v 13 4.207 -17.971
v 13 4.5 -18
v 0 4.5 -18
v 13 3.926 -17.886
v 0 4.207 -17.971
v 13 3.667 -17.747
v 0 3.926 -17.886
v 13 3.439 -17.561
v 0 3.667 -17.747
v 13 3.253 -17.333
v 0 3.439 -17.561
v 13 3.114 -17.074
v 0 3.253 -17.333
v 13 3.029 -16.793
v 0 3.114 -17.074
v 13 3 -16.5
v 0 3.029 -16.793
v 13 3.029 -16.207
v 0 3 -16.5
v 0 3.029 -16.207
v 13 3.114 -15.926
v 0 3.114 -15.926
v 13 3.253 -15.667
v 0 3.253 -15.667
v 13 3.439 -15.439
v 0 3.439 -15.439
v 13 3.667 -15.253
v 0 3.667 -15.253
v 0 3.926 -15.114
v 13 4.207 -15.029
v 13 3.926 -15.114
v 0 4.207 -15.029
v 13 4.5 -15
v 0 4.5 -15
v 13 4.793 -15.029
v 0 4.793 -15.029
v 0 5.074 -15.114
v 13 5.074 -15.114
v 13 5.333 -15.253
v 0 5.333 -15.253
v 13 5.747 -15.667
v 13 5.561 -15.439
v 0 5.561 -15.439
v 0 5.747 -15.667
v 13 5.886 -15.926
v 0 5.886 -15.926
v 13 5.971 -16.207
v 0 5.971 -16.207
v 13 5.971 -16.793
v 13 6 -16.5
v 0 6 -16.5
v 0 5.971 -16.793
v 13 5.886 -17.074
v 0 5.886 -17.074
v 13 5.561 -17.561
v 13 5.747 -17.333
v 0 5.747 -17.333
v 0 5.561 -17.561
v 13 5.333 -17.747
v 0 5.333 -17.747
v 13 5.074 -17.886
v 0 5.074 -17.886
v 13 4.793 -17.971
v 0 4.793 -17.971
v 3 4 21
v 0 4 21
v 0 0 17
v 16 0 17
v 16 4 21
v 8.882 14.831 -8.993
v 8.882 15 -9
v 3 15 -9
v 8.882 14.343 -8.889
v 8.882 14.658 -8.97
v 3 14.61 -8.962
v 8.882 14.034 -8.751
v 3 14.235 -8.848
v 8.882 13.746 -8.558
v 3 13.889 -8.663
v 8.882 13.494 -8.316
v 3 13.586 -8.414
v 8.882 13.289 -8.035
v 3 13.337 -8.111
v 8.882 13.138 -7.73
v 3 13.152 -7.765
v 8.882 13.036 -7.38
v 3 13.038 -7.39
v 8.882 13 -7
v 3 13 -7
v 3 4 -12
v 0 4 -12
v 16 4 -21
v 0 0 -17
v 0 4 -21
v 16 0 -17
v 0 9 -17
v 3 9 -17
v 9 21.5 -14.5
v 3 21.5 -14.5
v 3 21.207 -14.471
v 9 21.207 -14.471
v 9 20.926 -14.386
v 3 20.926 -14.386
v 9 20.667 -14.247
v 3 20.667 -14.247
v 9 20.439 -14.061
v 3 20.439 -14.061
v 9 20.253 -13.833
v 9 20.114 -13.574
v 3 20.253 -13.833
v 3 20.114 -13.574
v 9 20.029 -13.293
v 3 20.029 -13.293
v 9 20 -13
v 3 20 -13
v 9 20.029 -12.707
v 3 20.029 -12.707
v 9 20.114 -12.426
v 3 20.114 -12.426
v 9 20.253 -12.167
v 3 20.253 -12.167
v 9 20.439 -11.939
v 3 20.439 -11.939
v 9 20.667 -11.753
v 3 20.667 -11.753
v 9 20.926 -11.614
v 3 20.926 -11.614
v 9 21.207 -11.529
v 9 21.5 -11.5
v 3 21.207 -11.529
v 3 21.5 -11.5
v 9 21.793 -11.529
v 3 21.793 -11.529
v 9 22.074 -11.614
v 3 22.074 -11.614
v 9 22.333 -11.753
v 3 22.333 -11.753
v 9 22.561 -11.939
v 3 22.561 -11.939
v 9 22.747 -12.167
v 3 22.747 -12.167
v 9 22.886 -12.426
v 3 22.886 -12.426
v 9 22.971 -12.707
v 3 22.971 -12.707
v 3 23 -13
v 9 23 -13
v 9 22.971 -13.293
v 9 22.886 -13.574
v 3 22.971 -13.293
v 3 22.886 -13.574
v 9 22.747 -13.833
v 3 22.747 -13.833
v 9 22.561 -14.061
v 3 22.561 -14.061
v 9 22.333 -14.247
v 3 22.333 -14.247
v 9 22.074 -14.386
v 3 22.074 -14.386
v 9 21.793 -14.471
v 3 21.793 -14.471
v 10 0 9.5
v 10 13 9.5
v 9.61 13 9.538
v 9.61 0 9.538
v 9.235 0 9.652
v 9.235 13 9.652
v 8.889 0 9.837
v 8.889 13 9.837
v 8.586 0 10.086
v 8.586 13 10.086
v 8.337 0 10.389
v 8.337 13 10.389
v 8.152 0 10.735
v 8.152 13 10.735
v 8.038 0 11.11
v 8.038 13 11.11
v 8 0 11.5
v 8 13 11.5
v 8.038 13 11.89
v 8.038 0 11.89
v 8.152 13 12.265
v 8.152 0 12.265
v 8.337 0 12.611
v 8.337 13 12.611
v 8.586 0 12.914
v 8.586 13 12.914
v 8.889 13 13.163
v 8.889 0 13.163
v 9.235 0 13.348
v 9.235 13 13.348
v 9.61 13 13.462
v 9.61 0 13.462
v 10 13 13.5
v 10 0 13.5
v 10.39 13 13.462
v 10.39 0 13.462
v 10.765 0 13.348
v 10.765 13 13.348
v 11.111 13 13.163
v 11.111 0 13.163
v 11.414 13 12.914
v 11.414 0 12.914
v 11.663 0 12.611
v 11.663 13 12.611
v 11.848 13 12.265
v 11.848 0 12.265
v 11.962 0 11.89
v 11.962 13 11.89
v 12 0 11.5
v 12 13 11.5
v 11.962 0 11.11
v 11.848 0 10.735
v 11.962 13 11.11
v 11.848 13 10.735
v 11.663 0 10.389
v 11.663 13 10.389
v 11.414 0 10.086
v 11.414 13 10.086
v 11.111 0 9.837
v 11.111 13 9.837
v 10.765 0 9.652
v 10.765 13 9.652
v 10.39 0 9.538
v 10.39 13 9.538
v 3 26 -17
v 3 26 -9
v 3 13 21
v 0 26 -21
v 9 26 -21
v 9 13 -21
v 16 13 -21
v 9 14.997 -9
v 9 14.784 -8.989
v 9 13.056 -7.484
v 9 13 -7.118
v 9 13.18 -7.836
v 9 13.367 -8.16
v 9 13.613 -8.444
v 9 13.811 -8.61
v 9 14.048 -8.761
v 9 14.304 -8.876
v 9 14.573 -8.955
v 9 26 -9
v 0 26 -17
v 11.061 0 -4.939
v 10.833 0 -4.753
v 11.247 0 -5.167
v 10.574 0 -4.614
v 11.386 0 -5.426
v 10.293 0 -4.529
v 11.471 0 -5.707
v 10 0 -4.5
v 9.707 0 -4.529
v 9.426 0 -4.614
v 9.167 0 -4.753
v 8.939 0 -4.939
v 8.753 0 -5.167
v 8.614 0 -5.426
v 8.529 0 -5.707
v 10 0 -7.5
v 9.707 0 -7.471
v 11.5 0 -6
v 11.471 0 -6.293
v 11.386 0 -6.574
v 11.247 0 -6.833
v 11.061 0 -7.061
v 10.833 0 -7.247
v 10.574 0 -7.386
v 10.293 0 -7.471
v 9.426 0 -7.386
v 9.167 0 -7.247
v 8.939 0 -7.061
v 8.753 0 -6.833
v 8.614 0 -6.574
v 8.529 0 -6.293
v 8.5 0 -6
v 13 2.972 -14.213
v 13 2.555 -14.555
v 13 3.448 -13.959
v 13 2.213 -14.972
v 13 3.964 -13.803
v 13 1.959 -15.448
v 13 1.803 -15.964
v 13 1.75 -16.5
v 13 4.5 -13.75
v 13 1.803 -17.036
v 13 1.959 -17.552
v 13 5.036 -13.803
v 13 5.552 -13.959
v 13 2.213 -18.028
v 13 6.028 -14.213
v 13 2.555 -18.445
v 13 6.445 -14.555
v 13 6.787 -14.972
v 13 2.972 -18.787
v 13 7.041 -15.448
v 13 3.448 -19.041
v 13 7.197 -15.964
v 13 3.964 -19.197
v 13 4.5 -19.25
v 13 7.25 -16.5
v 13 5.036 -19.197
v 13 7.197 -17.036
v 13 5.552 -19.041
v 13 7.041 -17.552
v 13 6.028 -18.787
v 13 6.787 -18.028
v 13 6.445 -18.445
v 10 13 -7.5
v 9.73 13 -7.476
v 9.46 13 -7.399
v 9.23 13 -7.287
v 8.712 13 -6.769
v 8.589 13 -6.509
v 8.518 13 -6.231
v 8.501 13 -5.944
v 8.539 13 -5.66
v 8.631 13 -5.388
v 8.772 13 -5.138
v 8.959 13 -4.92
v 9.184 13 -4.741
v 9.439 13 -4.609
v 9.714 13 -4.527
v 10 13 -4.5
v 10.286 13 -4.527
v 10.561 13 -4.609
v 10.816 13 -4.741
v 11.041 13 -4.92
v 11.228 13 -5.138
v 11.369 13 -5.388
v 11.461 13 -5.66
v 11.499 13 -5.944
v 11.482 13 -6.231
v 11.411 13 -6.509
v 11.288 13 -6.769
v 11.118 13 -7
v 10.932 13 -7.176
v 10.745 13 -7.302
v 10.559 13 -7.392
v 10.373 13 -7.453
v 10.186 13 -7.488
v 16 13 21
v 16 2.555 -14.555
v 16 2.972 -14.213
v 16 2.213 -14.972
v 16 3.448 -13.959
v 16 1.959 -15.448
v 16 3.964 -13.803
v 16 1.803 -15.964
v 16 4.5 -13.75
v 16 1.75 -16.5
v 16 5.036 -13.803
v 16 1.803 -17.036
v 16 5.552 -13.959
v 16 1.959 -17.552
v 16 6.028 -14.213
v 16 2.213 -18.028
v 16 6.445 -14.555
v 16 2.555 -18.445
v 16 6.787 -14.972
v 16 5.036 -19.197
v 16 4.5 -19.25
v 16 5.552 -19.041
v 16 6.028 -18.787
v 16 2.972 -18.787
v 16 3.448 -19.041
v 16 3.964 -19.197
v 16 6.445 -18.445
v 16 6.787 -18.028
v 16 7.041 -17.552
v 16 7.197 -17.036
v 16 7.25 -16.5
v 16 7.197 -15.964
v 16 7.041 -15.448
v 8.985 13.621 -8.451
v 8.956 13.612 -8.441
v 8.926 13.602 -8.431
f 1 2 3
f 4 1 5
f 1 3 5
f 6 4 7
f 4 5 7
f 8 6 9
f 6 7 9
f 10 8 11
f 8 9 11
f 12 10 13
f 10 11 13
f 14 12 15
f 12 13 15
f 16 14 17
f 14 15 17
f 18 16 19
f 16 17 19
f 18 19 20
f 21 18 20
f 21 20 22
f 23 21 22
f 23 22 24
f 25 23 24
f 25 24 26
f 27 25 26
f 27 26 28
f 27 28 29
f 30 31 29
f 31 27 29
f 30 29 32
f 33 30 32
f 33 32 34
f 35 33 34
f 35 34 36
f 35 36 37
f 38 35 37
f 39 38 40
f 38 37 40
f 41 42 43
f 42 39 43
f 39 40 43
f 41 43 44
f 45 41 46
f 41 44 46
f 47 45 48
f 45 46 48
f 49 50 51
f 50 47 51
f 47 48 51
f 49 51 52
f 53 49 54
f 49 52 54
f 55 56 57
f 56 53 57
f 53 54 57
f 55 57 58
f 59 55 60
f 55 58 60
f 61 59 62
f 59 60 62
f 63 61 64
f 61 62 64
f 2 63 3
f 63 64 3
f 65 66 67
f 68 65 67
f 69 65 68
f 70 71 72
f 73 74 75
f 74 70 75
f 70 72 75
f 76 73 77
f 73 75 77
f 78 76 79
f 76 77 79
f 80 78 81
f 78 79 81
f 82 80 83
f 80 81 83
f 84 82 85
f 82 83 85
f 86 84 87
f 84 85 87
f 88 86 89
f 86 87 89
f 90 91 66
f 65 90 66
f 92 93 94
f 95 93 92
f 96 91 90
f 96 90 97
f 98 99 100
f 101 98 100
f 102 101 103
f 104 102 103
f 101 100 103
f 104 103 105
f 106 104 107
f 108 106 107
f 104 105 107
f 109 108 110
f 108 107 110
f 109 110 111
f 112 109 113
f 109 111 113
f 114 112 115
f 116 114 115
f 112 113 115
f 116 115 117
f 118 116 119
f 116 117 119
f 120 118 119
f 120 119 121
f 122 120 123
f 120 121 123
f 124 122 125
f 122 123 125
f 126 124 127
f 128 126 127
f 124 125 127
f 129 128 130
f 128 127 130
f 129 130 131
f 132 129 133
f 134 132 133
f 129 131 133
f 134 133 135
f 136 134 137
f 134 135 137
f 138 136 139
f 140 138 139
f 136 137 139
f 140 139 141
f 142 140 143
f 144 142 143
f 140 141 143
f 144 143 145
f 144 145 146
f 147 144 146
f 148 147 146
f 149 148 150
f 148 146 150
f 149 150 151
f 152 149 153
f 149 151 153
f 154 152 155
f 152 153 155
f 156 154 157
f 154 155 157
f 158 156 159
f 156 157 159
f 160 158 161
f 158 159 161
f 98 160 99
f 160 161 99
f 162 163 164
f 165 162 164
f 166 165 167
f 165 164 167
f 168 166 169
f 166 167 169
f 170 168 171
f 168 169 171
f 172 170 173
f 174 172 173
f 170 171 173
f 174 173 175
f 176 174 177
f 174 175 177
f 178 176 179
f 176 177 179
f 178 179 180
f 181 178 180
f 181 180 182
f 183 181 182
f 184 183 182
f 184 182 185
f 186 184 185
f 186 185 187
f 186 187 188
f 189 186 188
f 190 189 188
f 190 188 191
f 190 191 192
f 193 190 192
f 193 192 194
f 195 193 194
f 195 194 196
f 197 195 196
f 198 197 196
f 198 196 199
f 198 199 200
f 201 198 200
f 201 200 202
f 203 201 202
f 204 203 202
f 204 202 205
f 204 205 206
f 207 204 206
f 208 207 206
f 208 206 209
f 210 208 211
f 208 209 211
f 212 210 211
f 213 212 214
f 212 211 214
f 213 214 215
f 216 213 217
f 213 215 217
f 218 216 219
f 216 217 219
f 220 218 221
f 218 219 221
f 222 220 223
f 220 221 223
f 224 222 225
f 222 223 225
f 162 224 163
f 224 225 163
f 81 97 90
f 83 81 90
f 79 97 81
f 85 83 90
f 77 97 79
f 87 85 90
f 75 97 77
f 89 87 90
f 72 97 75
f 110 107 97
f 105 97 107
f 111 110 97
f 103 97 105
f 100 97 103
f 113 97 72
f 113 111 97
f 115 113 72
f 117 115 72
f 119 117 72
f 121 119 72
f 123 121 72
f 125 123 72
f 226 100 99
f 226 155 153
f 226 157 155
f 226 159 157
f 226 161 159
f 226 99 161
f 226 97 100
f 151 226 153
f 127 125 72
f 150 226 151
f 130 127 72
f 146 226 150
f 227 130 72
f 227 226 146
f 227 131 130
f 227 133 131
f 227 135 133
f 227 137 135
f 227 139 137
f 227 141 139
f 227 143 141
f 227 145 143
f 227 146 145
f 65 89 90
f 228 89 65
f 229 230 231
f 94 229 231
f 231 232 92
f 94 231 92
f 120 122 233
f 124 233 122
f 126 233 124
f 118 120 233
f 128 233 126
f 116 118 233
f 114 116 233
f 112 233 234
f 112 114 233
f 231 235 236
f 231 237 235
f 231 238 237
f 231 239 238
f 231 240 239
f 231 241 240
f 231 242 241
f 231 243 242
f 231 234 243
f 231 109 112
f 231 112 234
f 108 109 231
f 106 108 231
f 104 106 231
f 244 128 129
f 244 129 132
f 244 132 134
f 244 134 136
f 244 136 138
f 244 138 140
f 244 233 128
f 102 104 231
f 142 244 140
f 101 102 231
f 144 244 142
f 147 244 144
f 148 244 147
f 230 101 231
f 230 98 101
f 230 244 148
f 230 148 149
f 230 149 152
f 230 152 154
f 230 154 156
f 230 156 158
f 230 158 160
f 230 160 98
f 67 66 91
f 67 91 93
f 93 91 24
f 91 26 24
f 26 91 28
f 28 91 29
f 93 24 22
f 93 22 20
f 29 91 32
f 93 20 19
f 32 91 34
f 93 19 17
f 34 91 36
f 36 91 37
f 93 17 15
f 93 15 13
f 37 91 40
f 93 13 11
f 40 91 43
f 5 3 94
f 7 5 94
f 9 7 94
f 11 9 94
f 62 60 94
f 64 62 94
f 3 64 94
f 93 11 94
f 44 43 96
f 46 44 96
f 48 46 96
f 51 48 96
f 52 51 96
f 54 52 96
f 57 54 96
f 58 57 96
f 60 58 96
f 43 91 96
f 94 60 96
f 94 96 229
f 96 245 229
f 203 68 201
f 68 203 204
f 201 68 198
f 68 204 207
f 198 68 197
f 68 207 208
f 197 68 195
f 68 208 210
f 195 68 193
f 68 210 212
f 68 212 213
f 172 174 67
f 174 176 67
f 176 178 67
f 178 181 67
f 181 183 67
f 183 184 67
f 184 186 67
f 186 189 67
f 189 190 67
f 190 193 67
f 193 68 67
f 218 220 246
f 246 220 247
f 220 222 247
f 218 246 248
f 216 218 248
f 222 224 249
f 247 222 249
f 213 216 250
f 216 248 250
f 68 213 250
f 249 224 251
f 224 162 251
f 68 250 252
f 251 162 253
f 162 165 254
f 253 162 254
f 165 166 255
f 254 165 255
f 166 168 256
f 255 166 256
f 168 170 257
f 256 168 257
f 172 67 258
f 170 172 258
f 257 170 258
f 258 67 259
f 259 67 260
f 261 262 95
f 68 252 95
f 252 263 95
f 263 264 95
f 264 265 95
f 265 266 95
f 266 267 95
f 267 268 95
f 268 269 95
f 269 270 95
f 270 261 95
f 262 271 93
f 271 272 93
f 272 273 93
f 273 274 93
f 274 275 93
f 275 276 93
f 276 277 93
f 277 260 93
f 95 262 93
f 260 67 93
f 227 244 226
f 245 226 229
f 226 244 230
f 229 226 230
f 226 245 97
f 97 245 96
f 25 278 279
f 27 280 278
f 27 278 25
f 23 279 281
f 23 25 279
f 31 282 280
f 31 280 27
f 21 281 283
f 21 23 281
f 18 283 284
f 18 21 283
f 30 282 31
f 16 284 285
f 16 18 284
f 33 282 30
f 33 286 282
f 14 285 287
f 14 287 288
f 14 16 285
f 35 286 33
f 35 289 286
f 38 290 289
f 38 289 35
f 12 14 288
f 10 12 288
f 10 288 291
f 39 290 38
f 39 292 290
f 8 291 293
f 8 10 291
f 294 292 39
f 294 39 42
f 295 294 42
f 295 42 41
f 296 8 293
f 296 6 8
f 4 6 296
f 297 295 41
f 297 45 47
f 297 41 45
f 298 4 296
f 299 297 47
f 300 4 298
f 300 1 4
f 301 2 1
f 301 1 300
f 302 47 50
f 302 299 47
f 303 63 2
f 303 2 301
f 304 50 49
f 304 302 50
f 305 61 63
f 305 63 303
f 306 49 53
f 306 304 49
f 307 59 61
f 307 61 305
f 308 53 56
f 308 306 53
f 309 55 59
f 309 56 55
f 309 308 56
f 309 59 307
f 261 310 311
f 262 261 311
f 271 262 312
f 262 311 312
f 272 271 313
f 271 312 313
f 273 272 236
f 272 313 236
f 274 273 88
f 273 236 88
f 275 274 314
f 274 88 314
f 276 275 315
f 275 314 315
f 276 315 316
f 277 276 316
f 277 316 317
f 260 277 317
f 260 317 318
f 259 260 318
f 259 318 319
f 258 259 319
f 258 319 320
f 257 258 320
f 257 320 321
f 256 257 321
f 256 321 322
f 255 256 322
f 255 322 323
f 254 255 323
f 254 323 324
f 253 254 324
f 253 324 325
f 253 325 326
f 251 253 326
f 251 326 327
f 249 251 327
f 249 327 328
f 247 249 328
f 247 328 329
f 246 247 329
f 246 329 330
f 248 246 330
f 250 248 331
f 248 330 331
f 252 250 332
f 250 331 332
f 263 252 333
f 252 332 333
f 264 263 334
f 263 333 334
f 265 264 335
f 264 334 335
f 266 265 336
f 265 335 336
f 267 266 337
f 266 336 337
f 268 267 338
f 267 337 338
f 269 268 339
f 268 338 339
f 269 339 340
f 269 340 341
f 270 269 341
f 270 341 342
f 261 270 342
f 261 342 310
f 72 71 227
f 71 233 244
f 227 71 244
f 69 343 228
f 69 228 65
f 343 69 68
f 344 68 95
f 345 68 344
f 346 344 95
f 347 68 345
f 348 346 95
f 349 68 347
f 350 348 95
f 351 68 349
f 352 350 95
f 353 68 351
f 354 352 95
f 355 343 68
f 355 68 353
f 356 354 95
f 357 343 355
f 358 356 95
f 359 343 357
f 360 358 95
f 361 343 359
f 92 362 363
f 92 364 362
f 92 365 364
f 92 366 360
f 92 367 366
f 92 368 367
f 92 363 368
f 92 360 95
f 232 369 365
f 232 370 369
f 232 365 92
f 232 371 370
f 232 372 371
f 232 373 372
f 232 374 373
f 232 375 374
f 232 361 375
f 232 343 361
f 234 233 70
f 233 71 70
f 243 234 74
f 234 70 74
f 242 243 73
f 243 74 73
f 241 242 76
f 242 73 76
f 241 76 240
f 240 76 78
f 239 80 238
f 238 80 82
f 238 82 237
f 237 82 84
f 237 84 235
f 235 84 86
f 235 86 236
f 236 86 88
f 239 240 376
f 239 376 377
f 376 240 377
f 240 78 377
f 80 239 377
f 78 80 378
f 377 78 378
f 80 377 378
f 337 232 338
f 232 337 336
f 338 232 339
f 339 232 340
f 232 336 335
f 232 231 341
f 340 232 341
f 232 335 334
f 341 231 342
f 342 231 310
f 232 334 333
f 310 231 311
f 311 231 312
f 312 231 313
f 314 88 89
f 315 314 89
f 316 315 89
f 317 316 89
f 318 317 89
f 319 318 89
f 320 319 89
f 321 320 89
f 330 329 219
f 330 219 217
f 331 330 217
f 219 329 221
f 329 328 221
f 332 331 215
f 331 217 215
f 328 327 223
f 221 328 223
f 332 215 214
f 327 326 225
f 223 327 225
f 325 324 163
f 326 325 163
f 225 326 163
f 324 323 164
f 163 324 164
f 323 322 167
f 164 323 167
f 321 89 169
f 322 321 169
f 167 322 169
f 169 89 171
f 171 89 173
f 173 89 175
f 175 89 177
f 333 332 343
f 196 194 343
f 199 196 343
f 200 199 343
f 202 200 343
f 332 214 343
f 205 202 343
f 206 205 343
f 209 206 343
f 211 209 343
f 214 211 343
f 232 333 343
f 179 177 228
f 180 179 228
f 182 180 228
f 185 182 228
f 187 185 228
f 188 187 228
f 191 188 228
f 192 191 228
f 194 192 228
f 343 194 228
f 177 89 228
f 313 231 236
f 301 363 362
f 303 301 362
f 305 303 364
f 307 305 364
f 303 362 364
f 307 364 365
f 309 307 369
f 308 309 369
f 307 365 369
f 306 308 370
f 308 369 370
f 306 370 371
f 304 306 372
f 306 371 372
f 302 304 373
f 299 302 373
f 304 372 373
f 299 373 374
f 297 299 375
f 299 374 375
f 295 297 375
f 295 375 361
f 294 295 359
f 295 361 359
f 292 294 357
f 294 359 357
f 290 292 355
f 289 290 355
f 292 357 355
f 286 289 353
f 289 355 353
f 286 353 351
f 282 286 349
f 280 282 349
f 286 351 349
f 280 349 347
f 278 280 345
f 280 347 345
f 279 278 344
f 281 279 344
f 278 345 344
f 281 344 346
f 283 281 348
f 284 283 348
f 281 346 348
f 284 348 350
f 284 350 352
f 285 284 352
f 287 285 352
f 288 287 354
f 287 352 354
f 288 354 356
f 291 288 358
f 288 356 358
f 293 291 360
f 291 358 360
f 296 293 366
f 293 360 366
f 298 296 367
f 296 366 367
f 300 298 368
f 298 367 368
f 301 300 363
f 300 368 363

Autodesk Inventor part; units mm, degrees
ref_plane "YZ Plane" through (0, 0, 0) normal (1, 0, 0) x (0, 1, 0)
ref_plane "XZ Plane" through (0, 0, 0) normal (0, 1, 0) x (-1, 0, 0)
ref_plane "XY Plane" through (0, 0, 0) normal (0, 0, 1) x (1, 0, 0)
sketch "Szkic1" plane through (0, 0, 0) normal (1, 0, 0) x (0, 1, 0)
  line L0 (13, 21) -> (0, 21)
  line L1 (0, 21) -> (0, -21)
  line L2 (0, -21) -> (13, -21)
  line L3 (13, -21) -> (13, 21)
  line L4 (0, 0) -> (13, 0) construction
  dimension "d0" = 42
  dimension "d1" = 13
extrude "Wyciągnięcie proste3" add sketch "Szkic1" along normal blind 16
chamfer "Faza1" distance 4 angle 45 2 edges at (8, 0, 21) (8, 0, -21)
sketch "Szkic6" plane through (0, 0, -17) normal (0, -1, 0) x (1, 0, 0)
  line L0 (0, -4) -> (16, -4) projected
  line L1 (0, 34) -> (0, 0) projected
  line L2 (16, 34) -> (16, 0) projected
  point P0 (0, 17)
  point P1 (10, 11)
  dimension "d28" = 15
  dimension "d53" = 6
hole "Otwór2" at (10, 0, -6) direction (0, 1, 0) diameter 3 end through all
sketch "Szkic7" plane through (0, 0, -17) normal (0, -1, 0) x (1, 0, 0)
  line L0 (16, 38) -> (0, 38) projected
  circle A0 centre (10, 11) radius 1.5 projected
  point P0 (0, 17)
  point P1 (10, 28.5)
  dimension "d37" = 9.5
hole "Otwór3" at (10, 0, 11.5) direction (0, 1, 0) diameter 4 end through all
thread "Gwint2" size "M4x0.7" class "6H" standard "ANSI Metric M Profile" full length
sketch "Szkic8" plane through (0, 0, 0) normal (-1, 0, 0) x (0, 0, 1)
  line L0 (21, 13) -> (-17, 13)
  line L1 (-17, 13) -> (-17, 9)
  line L2 (-12, 4) -> (21, 4)
  line L3 (21, 4) -> (21, 13)
  line L4 (17, 0) -> (-17, 0) projected
  line L5 (-21, 4) -> (-21, 13) projected
  line L6 (-12, 4) -> (-17, 9)
  point P0 (0, 0)
  point P1 (-17, 4)
  dimension "d55" = 4
  dimension "d56" = 4
  dimension "d59" = 5
  dimension "d60" = 5
extrude "Wyciągnięcie proste5" cut sketch "Szkic8" against normal blind 3
sketch "Szkic9" plane through (16, 0, 0) normal (1, 0, 0) x (0, 0, -1)
  line L0 (-17, 0) -> (17, 0) projected
  line L1 (21, 4) -> (21, 13) projected
  point P0 (0, 0)
  point P1 (16.5, 4.5)
  dimension "d63" = 4.5
  dimension "d64" = 4.5
hole "Otwór4" at (16, 4.5, -16.5) direction (-1, 0, 0) diameter 3 end through all
thread "Gwint5" size "M3x0.5" class "6H" standard "ANSI Metric M Profile" full length
sketch "Szkic10" plane through (16, 0, 0) normal (1, 0, 0) x (0, 0, -1)
  line L0 (21, 13) -> (-21, 13) projected
  line L1 (21, 13) -> (9, 13)
  line L2 (9, 13) -> (9, 26)
  line L3 (9, 26) -> (21, 26)
  line L4 (21, 26) -> (21, 13)
  point P0 (0, 0)
  dimension "d74" = 12
  dimension "d75" = 13
extrude "Wyciągnięcie proste6" add sketch "Szkic10" against normal up to surface (16 mm away)
sketch "Szkic11" plane through (0, 0, 0) normal (-1, 0, 0) x (0, 0, 1)
  line L0 (-17, 9) -> (-17, 13) projected
  line L1 (-9, 26) -> (-21, 26) projected
  line L2 (-17, 13) -> (-9, 13)
  line L3 (-9, 13) -> (-9, 26)
  line L4 (-9, 26) -> (-17, 26)
  line L5 (-17, 26) -> (-17, 13)
  point P0 (0, 0)
extrude "Wyciągnięcie proste7" cut sketch "Szkic11" against normal up to surface (3 mm away)
fillet "Zaokrąglenie2" radius 2 1 edges at (9.5, 13, -9)
sketch "Szkic12" plane through (16, 0, 0) normal (1, 0, 0) x (0, 0, -1)
  circle A0 centre (16.5, 4.5) radius 1.5 projected
  circle A1 centre (16.5, 4.5) radius 2.75
  point P0 (0, 0)
  dimension "d83" = 1.25
extrude "Wyciągnięcie proste8" cut sketch "Szkic12" against normal blind 3
sketch "Szkic13" plane through (16, 0, 0) normal (1, 0, 0) x (0, 0, -1)
  line L0 (7, 13) -> (-21, 13) projected
  line L1 (21, 4) -> (21, 26) projected
  line L2 (7, 13) -> (21, 13)
  line L3 (21, 13) -> (21, 26)
  line L4 (21, 26) -> (7, 26)
  line L5 (7, 26) -> (7, 13)
  point P0 (0, 0)
extrude "Wyciągnięcie proste9" cut sketch "Szkic13" against normal blind 7
thread "Gwint7" size "M3x0.5" class "6H" standard "ANSI Metric M Profile" full length
sketch "Szkic14" plane through (9, 0, 0) normal (1, 0, 0) x (0, 0, -1)
  line L0 (21, 26) -> (21, 13) projected
  line L1 (9, 26) -> (21, 26) projected
  point P0 (0, 0)
  point P1 (13, 21.5)
  dimension "d90" = 8
  dimension "d91" = 4.5
hole "Otwór5" at (9, 21.5, -13) direction (-1, 0, 0) diameter 3 end through all
thread "Gwint8" size "M3x0.5" class "6H" standard "ANSI Metric M Profile" full length
equation "\"d60\" = d59"
properties part number "34_ekstruder2"
